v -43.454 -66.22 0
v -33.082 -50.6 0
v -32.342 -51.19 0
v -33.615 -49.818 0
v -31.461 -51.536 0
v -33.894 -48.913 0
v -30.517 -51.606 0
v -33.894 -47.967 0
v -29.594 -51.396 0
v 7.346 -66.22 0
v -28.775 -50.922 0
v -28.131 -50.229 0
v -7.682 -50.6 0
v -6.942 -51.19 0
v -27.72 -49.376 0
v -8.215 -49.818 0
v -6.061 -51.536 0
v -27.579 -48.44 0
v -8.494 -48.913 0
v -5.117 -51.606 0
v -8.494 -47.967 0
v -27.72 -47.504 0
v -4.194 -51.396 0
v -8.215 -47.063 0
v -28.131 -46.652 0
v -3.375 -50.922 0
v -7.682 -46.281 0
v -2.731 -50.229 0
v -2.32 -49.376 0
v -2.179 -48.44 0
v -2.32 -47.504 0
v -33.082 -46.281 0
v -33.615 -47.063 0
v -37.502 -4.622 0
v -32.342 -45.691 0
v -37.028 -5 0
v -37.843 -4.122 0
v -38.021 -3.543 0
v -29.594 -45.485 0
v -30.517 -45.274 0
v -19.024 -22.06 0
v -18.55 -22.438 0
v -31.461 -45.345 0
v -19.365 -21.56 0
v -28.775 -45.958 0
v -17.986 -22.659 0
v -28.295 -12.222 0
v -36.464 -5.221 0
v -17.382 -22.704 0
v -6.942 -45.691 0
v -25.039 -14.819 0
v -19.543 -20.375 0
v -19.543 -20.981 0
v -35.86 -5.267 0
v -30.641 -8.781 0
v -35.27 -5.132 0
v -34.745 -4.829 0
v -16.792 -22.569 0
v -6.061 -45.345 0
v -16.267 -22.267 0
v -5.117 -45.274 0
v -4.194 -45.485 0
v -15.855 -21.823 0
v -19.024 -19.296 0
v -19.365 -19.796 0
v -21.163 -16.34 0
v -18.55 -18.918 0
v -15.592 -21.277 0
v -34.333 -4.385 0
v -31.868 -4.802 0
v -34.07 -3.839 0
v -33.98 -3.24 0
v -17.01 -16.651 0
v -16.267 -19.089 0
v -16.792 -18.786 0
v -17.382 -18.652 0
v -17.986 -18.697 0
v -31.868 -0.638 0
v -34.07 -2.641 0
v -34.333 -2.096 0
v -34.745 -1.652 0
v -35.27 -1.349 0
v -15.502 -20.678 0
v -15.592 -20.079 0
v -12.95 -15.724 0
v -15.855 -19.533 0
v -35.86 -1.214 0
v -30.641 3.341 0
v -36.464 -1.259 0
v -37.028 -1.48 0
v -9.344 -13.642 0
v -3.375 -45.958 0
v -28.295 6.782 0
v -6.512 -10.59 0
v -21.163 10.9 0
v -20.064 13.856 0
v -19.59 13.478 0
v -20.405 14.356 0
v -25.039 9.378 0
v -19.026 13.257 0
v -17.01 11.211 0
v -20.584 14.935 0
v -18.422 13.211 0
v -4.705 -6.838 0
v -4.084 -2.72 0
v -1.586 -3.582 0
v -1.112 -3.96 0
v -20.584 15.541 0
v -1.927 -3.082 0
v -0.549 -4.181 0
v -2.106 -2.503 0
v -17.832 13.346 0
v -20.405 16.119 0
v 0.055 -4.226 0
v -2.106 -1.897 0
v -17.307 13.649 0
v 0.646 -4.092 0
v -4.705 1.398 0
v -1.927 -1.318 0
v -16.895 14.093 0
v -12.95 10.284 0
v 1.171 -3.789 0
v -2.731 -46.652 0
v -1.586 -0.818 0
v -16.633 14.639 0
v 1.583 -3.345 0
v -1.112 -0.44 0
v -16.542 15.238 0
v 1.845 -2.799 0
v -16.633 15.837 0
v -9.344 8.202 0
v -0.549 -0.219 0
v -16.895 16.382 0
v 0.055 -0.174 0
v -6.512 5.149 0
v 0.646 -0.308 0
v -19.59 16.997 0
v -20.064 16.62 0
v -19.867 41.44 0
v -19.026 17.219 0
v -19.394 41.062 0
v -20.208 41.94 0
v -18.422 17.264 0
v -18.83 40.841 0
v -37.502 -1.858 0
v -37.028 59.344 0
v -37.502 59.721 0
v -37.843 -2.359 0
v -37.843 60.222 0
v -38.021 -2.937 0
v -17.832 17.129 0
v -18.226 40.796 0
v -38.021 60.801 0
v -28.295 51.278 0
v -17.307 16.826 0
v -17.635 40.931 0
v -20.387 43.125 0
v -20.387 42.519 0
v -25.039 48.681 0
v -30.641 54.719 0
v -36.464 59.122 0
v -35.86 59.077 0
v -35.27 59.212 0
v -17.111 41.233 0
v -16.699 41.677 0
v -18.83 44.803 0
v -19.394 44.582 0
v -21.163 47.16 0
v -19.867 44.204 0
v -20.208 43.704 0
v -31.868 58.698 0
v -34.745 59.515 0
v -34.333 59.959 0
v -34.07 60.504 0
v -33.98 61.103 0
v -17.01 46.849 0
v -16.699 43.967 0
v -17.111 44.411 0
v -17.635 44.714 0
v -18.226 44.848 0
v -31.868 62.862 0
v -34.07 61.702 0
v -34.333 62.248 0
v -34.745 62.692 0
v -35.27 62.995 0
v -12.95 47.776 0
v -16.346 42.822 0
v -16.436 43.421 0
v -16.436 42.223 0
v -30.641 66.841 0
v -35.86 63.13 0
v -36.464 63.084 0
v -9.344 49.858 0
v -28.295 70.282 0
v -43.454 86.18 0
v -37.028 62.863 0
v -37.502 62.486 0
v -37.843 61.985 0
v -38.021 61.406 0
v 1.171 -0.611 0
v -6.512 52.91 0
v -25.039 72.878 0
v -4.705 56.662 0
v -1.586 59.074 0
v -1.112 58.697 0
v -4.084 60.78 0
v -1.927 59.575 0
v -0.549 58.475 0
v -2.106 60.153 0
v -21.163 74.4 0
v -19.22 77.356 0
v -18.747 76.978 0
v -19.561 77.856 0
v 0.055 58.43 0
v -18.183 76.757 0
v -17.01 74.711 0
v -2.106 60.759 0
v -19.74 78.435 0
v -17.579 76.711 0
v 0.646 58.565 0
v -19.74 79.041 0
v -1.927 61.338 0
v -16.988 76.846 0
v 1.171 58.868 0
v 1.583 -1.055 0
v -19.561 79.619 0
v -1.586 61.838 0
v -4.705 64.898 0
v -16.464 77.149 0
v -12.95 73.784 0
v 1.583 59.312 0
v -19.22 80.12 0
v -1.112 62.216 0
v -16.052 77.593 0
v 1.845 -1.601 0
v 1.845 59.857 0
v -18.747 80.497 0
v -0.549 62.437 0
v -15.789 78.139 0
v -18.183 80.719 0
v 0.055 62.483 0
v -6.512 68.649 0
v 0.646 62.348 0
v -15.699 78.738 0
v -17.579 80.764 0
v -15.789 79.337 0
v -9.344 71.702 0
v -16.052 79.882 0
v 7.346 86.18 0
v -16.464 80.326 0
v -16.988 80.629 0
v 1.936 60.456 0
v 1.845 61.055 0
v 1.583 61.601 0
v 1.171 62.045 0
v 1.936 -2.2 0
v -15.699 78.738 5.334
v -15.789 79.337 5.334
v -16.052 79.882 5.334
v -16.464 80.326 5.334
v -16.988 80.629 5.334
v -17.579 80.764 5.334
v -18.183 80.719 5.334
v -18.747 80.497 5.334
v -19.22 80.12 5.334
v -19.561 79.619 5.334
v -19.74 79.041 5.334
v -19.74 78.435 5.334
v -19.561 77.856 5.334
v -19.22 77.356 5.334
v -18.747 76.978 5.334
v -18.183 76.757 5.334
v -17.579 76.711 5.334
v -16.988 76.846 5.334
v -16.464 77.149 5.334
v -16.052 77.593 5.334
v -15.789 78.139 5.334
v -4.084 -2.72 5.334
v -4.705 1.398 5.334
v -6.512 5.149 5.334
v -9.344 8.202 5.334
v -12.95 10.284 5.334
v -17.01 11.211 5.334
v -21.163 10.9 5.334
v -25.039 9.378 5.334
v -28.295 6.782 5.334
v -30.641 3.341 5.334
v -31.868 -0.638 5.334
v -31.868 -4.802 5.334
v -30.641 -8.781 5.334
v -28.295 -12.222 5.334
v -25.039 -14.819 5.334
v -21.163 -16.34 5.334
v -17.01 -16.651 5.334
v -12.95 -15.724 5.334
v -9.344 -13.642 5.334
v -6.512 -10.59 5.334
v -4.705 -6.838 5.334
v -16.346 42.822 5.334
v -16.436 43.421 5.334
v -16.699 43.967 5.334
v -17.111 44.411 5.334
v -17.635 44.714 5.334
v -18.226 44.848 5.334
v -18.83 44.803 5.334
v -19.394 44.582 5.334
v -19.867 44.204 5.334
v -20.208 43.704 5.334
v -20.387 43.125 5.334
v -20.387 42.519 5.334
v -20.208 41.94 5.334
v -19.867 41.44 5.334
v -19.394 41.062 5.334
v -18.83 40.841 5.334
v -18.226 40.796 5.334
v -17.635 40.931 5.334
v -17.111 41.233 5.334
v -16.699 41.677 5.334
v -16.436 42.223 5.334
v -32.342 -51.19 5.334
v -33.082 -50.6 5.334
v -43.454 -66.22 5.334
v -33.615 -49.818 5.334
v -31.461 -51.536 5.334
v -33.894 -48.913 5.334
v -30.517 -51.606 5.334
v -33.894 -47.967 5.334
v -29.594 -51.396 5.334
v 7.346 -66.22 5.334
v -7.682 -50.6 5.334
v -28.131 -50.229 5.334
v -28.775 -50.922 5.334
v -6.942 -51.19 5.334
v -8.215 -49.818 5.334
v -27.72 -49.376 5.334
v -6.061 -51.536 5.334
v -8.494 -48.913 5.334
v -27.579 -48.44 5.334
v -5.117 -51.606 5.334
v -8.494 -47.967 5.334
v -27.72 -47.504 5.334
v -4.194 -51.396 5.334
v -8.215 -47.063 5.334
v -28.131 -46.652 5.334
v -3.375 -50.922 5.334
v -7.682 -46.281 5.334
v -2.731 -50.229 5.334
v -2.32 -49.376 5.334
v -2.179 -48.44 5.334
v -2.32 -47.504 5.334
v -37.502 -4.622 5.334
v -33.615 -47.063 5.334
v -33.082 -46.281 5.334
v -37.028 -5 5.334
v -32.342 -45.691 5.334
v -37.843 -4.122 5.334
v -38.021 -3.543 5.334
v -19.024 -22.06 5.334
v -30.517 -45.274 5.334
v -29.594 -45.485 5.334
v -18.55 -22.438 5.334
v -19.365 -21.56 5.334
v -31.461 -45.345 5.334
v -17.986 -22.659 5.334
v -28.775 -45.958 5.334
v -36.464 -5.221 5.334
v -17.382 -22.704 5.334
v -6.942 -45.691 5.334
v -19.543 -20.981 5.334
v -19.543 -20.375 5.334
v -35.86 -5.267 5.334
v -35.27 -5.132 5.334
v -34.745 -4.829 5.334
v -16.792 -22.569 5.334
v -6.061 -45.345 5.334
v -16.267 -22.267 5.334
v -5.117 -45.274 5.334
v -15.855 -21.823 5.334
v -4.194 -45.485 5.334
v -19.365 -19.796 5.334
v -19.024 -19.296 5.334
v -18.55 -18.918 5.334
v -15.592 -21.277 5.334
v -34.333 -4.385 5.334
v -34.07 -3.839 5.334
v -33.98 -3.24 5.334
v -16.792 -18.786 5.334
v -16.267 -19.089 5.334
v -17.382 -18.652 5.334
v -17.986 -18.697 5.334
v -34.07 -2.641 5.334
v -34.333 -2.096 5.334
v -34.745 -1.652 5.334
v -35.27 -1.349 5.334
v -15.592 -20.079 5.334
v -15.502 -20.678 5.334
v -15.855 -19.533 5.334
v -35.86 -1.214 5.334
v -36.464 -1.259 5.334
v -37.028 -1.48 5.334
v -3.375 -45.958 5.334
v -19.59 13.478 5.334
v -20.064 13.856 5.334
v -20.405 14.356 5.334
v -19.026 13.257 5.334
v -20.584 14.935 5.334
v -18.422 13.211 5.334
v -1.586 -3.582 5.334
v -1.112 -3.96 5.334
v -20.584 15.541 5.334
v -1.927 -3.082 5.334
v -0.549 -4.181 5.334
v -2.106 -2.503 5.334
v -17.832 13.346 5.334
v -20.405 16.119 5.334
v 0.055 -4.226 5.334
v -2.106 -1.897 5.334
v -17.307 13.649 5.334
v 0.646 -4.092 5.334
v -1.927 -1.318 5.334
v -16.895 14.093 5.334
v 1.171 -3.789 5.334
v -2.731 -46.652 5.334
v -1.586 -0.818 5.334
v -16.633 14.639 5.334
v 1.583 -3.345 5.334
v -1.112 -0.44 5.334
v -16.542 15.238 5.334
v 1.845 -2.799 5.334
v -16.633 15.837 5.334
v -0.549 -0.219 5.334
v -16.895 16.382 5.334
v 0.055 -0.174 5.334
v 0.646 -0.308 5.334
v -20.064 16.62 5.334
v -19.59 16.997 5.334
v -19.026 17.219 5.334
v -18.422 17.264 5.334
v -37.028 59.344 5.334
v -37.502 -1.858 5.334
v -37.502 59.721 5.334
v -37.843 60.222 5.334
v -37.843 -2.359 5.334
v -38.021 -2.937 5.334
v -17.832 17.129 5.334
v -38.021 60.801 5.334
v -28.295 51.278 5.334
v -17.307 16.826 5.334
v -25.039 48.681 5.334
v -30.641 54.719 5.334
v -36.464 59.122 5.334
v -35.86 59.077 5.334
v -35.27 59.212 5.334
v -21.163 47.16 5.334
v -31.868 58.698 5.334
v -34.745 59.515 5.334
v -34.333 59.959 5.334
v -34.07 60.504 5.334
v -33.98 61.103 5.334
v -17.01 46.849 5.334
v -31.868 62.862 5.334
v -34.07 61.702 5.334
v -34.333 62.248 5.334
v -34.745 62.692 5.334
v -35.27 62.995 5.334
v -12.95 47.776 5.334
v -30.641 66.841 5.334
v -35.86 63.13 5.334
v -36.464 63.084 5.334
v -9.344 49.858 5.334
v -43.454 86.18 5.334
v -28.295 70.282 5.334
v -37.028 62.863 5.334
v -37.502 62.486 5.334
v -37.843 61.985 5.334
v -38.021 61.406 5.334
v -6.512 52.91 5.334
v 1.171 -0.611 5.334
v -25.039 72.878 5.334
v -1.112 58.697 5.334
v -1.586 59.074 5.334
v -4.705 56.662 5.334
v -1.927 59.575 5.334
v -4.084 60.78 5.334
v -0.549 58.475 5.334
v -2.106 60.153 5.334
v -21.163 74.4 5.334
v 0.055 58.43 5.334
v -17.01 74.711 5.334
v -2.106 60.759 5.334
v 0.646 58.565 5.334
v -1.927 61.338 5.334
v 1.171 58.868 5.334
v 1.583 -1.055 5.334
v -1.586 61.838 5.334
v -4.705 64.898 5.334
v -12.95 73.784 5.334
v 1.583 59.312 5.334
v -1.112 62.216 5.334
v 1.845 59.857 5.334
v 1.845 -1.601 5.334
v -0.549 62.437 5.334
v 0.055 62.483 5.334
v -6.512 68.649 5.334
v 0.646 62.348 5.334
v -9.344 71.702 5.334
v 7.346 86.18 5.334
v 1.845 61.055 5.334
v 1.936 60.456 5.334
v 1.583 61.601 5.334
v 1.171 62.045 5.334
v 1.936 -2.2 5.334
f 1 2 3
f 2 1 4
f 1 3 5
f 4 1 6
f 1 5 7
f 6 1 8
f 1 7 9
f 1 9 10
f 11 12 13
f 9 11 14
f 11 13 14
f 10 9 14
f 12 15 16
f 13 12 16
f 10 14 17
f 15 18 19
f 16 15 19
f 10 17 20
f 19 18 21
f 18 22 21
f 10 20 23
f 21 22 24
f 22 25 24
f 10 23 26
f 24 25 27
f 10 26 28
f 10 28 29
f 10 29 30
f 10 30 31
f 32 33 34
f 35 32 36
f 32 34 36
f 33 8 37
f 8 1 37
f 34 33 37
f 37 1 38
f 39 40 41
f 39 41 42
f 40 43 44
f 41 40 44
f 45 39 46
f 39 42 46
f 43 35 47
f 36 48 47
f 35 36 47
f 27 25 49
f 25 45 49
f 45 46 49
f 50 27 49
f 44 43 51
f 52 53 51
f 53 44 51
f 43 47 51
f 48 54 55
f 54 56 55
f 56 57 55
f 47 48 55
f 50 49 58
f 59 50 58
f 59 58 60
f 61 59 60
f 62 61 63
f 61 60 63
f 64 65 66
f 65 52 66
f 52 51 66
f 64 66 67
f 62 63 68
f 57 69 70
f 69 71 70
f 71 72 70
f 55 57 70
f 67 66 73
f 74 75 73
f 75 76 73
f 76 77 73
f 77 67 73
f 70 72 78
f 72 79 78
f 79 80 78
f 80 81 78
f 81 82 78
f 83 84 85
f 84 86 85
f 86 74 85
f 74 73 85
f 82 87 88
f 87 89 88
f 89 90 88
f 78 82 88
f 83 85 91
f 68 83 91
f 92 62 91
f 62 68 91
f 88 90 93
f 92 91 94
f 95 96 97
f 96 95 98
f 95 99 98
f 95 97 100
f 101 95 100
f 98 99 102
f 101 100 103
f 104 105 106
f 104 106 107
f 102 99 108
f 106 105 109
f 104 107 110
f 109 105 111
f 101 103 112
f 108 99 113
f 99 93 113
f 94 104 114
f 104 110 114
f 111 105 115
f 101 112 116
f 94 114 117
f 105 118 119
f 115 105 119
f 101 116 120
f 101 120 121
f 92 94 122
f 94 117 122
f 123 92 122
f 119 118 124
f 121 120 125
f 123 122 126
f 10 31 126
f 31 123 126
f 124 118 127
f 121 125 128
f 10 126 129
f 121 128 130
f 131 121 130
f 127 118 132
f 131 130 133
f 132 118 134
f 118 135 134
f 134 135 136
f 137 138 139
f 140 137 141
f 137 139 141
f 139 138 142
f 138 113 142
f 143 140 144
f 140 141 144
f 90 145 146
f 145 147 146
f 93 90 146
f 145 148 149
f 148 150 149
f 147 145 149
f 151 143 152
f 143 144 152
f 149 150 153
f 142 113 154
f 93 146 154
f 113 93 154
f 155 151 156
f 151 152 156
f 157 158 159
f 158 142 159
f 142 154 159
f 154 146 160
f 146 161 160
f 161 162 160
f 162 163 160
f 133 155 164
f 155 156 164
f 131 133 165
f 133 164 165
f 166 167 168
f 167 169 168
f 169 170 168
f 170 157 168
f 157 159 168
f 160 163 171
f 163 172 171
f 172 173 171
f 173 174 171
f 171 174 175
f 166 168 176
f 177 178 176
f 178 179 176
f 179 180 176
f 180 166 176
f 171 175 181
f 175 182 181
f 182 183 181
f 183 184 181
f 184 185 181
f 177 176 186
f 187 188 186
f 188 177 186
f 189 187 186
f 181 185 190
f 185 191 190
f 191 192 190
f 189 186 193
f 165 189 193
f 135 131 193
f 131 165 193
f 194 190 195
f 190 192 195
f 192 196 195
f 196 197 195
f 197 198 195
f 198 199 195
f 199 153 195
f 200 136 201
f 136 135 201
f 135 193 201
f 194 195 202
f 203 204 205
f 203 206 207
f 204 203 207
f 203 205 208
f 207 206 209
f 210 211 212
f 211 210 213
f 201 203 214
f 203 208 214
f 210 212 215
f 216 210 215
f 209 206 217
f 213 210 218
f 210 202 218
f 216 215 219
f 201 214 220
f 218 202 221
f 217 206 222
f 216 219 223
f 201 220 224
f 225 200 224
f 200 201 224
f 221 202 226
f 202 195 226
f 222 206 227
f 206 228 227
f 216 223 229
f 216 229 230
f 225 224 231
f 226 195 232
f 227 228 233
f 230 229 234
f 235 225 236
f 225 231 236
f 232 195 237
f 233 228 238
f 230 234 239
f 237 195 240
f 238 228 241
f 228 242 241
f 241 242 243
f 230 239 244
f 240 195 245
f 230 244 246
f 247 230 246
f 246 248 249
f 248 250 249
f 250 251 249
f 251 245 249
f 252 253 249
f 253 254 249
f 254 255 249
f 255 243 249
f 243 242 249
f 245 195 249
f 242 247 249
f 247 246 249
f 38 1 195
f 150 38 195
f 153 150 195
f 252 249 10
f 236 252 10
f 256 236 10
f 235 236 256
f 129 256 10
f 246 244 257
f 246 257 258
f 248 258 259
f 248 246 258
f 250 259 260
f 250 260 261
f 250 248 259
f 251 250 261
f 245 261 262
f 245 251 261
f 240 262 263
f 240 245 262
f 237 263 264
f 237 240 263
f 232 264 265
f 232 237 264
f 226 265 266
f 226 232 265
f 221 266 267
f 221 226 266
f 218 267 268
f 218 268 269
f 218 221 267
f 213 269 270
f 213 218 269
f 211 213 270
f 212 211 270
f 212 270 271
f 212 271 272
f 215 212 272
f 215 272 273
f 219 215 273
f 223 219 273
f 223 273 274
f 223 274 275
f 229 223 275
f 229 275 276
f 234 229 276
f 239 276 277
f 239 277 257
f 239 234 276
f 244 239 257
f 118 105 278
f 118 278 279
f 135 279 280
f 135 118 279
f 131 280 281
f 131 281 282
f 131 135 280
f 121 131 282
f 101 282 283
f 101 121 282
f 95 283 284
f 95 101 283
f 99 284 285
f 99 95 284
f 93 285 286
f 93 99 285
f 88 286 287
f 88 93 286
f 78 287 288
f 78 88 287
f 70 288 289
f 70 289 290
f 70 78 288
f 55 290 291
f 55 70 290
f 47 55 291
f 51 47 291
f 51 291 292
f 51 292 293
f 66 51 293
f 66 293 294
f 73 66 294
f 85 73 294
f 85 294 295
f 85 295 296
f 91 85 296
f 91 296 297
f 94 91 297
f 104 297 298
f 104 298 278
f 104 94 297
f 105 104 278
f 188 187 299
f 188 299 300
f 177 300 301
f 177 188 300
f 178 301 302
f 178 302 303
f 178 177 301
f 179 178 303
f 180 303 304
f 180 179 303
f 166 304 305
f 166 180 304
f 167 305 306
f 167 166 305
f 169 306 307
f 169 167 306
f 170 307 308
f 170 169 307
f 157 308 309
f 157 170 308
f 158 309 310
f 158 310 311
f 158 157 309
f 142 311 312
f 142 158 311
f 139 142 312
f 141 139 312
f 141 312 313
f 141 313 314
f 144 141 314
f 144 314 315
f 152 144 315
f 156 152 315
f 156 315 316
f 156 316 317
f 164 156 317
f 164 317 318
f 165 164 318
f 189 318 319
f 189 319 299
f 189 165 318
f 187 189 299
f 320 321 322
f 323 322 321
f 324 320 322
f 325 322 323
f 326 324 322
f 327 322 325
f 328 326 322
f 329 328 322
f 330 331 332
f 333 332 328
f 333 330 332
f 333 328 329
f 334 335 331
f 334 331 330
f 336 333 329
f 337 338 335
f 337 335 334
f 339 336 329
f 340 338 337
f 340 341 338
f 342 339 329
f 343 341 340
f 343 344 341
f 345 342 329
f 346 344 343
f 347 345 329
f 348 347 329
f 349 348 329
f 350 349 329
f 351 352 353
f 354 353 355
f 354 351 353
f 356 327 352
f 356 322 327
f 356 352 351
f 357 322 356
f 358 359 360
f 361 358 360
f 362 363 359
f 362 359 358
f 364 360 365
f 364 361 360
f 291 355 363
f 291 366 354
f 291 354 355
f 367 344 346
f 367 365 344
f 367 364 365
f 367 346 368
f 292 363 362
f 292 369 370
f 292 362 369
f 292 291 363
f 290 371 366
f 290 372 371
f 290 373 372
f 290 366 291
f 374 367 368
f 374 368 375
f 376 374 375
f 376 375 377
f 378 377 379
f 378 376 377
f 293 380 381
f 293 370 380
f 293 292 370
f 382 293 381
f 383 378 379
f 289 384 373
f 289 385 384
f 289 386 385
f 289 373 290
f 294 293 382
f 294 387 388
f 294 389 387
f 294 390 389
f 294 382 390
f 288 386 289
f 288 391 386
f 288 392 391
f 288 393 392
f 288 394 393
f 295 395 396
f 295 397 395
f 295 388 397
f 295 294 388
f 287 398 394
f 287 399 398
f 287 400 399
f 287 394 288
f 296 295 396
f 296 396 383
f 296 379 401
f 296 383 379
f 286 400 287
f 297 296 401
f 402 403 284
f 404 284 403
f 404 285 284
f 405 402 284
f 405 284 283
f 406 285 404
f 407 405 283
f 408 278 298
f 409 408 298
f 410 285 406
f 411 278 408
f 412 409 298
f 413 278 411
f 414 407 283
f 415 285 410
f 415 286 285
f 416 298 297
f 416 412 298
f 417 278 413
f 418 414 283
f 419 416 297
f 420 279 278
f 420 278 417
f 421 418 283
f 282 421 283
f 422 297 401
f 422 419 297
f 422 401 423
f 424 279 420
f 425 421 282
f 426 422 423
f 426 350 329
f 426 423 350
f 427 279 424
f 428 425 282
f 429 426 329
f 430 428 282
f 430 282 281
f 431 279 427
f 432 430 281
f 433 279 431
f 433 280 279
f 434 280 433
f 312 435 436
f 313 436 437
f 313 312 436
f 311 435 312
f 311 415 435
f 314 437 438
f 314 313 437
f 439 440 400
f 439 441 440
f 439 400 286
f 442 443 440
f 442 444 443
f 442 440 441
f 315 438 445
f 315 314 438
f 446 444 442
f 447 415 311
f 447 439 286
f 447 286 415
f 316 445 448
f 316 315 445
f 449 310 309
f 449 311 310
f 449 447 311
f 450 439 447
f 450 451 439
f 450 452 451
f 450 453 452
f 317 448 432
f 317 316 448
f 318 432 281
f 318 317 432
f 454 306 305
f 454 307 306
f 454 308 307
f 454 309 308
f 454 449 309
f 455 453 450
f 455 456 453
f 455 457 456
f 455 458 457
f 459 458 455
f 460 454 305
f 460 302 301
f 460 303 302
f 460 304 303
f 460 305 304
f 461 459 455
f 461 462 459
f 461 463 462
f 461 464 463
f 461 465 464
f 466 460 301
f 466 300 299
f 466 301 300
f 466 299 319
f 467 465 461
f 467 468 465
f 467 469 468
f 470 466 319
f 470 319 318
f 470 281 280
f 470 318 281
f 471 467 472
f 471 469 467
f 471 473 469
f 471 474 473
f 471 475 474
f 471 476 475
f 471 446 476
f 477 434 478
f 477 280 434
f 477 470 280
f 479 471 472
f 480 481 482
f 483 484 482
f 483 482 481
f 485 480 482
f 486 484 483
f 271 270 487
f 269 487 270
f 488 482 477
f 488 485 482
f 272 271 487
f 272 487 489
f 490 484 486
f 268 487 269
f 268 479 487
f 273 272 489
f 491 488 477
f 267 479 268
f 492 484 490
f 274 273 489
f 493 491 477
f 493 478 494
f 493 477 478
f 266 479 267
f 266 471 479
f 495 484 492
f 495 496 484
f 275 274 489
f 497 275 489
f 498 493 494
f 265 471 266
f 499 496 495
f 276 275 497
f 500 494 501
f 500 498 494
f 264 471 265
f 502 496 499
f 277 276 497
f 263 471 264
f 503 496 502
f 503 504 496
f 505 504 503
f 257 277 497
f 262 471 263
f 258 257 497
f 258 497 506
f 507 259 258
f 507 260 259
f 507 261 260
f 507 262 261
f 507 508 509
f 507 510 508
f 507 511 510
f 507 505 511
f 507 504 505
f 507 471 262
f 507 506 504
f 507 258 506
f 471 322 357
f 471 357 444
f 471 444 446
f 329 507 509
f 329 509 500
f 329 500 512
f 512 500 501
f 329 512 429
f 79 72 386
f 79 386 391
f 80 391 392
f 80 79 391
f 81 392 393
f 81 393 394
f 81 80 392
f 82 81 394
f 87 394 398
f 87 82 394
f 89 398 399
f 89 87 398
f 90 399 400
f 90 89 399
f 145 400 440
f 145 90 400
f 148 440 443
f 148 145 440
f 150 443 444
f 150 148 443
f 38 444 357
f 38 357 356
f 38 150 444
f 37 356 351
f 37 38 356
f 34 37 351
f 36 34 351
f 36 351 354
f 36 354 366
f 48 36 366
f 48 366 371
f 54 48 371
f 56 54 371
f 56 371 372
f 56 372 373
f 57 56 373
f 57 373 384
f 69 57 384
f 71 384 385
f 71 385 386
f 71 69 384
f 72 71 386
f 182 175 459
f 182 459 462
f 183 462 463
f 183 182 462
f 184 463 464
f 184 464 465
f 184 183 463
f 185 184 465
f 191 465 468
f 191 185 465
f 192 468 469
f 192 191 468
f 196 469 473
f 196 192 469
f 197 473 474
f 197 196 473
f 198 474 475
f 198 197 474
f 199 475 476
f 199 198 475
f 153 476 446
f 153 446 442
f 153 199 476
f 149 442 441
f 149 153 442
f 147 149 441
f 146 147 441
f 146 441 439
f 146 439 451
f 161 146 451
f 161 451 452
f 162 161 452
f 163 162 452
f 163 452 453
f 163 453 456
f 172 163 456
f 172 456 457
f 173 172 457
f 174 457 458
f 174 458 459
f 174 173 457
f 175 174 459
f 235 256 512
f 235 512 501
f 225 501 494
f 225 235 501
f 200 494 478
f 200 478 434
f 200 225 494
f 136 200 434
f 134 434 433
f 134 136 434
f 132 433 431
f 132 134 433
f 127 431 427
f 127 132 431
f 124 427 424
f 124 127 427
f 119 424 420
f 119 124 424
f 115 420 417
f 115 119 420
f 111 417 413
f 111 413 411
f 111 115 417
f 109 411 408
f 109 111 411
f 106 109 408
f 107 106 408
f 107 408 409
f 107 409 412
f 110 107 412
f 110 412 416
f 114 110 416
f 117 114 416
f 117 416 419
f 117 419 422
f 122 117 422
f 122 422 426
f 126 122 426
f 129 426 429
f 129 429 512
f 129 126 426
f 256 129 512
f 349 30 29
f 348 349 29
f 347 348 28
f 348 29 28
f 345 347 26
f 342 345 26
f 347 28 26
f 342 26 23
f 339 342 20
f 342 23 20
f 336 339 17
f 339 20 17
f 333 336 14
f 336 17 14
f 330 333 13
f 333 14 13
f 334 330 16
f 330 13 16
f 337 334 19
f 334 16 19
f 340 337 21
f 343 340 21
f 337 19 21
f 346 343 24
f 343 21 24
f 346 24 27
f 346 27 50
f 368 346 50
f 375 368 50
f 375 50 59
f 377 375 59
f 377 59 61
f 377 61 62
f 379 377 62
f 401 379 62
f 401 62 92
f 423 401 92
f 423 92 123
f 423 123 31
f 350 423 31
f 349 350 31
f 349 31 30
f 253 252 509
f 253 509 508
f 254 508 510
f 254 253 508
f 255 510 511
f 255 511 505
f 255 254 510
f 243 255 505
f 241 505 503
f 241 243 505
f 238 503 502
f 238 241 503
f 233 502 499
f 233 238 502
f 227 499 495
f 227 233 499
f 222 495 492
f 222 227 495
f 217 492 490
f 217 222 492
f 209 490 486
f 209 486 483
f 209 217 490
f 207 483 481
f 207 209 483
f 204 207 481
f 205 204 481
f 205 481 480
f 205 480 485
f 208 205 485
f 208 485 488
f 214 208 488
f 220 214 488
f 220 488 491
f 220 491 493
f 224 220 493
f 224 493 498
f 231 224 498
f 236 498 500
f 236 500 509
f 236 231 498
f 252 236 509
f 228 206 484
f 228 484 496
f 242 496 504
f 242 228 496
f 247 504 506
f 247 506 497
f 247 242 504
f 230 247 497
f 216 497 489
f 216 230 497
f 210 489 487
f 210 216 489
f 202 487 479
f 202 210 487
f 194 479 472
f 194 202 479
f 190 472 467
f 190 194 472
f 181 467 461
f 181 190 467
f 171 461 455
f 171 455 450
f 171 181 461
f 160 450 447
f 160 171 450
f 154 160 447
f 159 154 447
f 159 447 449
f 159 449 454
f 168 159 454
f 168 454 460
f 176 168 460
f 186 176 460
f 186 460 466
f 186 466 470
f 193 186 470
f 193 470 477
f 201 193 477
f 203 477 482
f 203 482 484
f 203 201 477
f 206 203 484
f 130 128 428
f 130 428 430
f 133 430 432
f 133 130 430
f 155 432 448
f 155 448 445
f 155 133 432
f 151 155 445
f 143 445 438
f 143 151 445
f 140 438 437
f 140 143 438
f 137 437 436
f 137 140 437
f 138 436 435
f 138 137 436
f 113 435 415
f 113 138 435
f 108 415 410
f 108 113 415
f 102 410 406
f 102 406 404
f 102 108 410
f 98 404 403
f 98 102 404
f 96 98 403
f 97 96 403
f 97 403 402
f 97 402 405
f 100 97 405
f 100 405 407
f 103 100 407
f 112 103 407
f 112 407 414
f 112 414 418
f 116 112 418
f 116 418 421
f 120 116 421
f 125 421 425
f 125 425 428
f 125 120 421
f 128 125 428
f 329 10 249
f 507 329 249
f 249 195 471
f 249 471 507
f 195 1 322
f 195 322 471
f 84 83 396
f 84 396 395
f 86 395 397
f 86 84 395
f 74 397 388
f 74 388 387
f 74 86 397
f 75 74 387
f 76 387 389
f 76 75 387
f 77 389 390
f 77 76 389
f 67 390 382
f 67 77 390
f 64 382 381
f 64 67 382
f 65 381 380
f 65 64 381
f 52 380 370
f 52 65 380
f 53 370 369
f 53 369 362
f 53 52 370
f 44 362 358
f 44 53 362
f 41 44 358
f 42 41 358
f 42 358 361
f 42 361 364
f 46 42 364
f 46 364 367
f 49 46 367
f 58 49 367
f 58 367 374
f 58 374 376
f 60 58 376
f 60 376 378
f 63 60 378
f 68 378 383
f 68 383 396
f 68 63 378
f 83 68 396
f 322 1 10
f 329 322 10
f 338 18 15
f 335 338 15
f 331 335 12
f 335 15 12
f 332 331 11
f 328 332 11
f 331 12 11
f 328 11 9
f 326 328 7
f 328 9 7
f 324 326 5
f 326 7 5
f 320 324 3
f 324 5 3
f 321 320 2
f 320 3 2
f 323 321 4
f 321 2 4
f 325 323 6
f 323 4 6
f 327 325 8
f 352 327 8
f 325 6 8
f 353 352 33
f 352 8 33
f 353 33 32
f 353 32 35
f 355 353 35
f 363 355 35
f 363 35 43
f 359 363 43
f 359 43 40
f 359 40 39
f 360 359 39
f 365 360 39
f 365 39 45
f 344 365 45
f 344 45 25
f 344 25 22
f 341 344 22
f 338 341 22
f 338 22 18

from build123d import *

# Parameters (mm, degrees)
F0_W     = 50.8
F0_H     = 152.4
F0_R     = 2.032
F0_R_2   = 13.97
F1_DEPTH = 5.334
F2_R     = 3.175
F3_DEPTH = 25.4


with BuildPart() as f1:
    # F0 (on Top) → F1 (new body)
    with BuildSketch(Plane.XY):
        with Locations((-18.054181, 9.979866)):
            Rectangle(F0_W, F0_H)
        with Locations((-36.011981, -3.240235)):
            Circle(F0_R, mode=Mode.SUBTRACT)
        with Locations((-18.054181, -2.720134)):
            Circle(F0_R_2, mode=Mode.SUBTRACT)
        with Locations((-17.53408, -20.677934)):
            Circle(F0_R, mode=Mode.SUBTRACT)
        with Locations((-0.096381, -2.200033)):
            Circle(F0_R, mode=Mode.SUBTRACT)
        with Locations((-18.574282, 15.237666)):
            Circle(F0_R, mode=Mode.SUBTRACT)
        with Locations((-18.377712, 42.822066)):
            Circle(F0_R, mode=Mode.SUBTRACT)
        with Locations((-36.011981, 61.103397)):
            Circle(F0_R, mode=Mode.SUBTRACT)
        with Locations((-18.054181, 60.779866)):
            Circle(F0_R_2, mode=Mode.SUBTRACT)
        with Locations((-17.730651, 78.737666)):
            Circle(F0_R, mode=Mode.SUBTRACT)
        with Locations((-0.096381, 60.456336)):
            Circle(F0_R, mode=Mode.SUBTRACT)
    extrude(amount=F1_DEPTH)

    # F2 (on face) → F3 (cut)
    with BuildSketch(Plane(origin=(0, 0, 0), x_dir=(1, 0, 0), z_dir=(0, 0, -1))):
        with Locations((-5.354181, 48.440134)):
            Circle(F2_R)
        with Locations((-30.754181, 48.440134)):
            Circle(F2_R)
    extrude(amount=-F3_DEPTH, mode=Mode.SUBTRACT)


solid = f1.part
